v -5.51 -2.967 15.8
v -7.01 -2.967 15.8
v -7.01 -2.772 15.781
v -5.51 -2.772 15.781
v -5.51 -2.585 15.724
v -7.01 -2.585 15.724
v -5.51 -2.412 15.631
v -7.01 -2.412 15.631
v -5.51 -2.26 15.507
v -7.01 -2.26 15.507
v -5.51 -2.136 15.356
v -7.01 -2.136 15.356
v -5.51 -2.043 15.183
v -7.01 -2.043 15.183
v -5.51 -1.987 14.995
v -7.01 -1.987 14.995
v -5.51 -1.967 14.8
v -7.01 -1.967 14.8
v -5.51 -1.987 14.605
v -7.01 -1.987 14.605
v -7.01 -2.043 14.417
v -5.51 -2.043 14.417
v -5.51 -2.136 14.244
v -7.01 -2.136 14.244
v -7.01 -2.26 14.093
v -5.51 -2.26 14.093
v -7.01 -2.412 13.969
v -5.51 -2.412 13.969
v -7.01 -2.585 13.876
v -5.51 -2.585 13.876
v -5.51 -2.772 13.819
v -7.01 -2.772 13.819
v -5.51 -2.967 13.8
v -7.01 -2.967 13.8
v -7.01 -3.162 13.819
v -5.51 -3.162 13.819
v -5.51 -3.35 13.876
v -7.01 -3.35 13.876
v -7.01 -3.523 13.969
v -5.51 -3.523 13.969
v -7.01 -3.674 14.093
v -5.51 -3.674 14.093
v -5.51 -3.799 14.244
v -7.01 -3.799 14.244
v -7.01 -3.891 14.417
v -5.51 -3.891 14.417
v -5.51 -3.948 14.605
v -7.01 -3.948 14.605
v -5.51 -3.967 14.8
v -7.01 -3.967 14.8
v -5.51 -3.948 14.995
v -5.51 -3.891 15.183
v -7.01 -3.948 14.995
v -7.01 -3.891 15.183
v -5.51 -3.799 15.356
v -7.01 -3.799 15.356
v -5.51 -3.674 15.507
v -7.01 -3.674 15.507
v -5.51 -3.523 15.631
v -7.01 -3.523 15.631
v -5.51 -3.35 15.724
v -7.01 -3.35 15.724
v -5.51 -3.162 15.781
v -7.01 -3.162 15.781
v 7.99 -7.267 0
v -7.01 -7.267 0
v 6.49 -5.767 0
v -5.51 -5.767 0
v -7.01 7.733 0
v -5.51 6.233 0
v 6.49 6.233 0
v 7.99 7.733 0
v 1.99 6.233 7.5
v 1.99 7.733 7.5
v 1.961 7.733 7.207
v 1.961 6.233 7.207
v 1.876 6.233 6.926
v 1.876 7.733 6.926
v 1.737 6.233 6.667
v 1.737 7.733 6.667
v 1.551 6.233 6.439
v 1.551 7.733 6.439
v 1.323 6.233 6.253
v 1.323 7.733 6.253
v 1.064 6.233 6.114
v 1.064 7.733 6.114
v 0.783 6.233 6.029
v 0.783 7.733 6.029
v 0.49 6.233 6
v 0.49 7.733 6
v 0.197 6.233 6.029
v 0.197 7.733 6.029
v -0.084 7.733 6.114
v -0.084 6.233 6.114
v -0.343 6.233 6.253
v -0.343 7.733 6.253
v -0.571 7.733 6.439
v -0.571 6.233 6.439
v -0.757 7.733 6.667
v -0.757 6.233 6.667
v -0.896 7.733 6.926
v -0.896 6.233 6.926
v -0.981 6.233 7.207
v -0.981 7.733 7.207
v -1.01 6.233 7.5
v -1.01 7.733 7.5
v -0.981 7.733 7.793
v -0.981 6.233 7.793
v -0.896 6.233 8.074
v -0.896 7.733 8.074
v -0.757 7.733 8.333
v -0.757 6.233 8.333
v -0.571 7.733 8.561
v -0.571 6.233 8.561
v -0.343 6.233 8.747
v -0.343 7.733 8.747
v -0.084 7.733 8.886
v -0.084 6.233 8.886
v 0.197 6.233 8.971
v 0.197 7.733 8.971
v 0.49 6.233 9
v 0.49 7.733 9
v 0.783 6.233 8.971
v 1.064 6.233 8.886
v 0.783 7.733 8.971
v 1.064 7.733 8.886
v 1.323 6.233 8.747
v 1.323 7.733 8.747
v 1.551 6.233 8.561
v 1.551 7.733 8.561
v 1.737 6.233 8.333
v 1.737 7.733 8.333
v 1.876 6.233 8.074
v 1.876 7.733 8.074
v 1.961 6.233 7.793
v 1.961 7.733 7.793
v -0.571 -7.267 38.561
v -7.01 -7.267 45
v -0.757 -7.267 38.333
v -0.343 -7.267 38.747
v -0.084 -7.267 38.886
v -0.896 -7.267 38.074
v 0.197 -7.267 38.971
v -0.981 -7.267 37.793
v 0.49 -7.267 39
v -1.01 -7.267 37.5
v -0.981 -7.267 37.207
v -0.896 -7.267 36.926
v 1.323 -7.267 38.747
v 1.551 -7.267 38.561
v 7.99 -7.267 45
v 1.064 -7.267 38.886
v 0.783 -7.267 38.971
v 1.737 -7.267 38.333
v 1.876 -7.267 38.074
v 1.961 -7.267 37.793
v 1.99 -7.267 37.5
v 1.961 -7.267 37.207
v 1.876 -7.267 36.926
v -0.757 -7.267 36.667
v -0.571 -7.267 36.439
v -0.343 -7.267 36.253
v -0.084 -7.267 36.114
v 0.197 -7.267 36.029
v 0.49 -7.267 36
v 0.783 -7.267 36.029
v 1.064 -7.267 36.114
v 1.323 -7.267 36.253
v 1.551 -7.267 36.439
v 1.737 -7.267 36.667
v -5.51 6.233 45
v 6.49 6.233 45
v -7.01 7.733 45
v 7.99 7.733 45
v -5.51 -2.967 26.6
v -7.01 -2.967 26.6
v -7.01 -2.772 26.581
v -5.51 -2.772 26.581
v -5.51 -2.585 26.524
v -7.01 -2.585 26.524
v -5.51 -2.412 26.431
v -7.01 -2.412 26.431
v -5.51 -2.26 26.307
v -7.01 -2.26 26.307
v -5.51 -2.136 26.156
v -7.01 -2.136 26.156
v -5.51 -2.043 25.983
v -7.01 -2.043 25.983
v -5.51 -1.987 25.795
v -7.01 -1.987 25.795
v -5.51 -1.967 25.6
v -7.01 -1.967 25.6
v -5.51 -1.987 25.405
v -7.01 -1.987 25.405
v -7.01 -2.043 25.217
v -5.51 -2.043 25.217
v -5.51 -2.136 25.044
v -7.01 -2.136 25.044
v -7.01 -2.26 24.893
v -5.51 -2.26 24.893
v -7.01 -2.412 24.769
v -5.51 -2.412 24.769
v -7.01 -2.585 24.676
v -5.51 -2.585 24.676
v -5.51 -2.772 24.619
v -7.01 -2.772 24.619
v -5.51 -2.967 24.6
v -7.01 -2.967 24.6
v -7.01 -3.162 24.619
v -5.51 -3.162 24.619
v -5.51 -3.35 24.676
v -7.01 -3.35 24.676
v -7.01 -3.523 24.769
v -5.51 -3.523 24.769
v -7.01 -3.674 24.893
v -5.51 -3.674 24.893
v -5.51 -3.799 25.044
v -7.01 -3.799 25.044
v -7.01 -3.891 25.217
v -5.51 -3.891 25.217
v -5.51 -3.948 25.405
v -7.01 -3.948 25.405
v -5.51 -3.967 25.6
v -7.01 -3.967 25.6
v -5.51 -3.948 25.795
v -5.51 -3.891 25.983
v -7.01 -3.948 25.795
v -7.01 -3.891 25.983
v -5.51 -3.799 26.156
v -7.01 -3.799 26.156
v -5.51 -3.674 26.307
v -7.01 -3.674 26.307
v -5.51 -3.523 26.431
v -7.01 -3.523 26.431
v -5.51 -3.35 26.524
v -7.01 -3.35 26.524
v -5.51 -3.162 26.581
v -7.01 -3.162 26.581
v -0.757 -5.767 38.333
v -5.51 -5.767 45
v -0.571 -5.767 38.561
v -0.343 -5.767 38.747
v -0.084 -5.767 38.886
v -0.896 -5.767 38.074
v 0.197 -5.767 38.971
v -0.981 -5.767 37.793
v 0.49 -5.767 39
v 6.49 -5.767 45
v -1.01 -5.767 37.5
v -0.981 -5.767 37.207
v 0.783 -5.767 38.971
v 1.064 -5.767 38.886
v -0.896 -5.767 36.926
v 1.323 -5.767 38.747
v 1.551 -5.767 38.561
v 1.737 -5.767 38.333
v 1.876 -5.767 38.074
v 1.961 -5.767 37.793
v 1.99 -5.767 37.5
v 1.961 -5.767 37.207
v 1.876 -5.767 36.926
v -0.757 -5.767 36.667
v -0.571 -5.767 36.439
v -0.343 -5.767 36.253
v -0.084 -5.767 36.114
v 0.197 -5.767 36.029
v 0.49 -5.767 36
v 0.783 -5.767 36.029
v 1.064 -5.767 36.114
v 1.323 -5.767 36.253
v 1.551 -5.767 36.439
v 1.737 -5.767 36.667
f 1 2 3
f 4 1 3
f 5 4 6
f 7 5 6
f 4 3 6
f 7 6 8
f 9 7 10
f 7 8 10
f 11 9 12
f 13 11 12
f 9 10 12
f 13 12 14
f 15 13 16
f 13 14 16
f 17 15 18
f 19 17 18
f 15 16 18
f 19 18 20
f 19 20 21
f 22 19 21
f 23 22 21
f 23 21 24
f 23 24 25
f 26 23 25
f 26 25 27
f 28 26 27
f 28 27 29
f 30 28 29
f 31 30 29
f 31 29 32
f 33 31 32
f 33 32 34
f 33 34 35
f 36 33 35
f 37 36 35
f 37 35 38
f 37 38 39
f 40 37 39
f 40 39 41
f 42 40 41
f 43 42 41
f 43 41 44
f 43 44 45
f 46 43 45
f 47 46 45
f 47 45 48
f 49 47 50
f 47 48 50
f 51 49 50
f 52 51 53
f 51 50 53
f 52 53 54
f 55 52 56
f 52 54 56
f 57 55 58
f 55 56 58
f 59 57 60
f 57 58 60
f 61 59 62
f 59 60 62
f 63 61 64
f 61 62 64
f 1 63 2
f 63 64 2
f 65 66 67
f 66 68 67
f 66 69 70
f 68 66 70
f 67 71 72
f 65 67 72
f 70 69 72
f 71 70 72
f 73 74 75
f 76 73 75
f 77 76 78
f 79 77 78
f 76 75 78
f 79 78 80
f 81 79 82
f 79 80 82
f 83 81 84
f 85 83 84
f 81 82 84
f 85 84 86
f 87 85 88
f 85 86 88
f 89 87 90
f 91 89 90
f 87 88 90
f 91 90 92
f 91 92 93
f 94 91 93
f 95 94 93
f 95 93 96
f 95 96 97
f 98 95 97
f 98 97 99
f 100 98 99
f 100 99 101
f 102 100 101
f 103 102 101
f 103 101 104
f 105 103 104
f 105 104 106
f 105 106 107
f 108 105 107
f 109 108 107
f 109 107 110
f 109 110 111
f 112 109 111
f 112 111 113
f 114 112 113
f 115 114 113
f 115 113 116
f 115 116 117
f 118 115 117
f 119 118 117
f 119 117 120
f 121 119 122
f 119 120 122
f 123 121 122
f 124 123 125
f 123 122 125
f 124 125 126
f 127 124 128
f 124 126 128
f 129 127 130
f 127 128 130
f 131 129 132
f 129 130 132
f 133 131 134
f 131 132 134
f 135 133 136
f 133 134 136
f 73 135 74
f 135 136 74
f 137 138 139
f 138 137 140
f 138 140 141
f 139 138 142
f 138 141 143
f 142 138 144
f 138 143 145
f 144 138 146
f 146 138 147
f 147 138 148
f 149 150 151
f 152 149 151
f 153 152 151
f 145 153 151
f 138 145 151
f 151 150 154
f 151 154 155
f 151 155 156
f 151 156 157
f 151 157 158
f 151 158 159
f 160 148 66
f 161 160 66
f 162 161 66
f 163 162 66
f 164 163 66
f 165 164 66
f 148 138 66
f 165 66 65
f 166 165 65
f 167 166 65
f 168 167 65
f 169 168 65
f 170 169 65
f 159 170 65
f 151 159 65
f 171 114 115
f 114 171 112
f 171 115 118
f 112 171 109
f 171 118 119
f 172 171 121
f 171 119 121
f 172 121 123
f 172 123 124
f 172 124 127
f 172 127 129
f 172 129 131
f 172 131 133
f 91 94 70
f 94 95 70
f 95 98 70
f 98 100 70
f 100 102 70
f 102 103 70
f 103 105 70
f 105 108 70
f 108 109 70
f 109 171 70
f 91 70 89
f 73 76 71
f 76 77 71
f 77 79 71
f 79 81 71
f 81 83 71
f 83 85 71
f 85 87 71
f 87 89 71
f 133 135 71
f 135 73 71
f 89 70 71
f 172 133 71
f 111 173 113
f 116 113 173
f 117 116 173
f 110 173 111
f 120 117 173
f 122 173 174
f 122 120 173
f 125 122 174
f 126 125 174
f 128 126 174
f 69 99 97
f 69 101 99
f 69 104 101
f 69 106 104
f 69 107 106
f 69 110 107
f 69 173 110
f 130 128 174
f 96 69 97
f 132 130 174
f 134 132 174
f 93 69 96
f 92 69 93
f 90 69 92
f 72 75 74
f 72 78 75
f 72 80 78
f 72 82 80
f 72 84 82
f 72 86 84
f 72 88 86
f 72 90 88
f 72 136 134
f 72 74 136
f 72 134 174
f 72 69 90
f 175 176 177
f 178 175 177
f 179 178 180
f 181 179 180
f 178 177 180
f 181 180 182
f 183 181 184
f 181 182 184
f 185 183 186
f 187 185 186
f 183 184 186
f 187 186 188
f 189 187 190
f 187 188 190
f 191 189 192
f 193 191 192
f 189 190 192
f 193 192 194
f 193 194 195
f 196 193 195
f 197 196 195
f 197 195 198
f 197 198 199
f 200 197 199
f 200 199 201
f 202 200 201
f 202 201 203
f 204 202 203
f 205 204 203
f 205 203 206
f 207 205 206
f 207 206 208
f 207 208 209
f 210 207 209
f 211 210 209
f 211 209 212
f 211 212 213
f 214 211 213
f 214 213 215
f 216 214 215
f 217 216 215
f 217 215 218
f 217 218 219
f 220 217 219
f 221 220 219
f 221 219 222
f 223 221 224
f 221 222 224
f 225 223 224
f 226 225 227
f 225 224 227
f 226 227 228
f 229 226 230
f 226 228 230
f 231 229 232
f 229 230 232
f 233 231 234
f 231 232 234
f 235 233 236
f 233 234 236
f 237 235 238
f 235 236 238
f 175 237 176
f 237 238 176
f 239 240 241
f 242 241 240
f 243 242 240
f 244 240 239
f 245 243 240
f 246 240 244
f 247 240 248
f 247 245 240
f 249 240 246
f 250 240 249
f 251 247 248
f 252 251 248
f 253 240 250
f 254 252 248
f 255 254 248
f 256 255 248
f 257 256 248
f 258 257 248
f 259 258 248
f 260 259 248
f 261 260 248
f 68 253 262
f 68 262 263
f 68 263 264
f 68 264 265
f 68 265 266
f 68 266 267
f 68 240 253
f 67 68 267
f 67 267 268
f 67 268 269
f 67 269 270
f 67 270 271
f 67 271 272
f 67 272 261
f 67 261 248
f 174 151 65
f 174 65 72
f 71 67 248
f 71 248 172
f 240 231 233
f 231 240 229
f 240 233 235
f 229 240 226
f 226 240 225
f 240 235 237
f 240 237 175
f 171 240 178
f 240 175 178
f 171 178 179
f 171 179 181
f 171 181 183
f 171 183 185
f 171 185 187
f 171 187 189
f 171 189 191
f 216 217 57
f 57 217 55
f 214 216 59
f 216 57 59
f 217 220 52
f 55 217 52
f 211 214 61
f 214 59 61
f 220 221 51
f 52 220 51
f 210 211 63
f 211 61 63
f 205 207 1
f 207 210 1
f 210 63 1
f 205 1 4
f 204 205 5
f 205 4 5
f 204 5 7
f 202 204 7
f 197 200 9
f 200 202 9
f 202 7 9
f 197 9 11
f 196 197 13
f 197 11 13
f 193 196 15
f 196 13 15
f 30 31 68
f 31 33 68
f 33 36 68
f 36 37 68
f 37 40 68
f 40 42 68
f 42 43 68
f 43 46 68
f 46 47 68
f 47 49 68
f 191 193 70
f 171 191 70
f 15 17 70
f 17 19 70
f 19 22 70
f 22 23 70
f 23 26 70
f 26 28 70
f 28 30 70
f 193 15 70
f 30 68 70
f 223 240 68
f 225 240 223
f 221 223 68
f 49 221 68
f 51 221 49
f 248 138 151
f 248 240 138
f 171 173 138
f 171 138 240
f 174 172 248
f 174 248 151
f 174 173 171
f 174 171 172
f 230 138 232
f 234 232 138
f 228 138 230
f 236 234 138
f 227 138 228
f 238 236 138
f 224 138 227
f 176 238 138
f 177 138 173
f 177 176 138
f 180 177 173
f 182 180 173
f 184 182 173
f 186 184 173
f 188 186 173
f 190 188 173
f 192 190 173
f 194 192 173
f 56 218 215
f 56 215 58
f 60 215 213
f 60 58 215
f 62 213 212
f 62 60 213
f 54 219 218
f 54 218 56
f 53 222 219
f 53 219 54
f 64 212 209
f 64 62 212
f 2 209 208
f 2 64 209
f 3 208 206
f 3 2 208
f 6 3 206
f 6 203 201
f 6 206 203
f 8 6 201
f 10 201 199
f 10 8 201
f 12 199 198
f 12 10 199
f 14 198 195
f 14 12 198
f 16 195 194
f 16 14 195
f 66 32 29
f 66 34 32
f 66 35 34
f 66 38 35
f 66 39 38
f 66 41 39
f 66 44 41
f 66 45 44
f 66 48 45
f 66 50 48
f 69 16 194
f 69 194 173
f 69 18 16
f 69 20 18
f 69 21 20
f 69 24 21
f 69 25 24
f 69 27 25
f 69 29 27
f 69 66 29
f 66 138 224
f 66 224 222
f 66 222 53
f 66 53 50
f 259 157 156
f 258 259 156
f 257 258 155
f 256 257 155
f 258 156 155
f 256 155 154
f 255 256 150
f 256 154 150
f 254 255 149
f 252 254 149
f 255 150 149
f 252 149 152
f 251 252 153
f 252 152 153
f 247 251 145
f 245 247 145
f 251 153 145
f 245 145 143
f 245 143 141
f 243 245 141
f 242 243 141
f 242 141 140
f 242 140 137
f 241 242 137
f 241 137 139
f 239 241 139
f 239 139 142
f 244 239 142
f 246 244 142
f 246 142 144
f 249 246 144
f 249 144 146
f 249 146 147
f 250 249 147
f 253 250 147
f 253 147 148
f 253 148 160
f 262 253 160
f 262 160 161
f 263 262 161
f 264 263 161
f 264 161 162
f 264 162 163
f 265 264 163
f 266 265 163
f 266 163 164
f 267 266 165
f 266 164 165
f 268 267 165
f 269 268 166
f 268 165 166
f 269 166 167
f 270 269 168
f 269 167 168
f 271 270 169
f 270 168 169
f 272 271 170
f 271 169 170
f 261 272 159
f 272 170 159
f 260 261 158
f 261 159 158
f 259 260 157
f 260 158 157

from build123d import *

# Parameters (mm, degrees)
SKETCH_1_W          = 15
SKETCH_1_H          = 15
SKETCH_1_W_2        = 12
SKETCH_1_H_2        = 12
EXTRUDE_2_DEPTH     = 45
SKETCH_2_R          = 1.5
CUT_EXTRUDE_1_DEPTH = 10
SKETCH_3_R          = 1.5
CUT_EXTRUDE_2_DEPTH = 10
SKETCH_7_R          = 1
CUT_EXTRUDE_5_DEPTH = 10


with BuildPart() as part:
    # ｽｹｯﾁ1 → ﾎﾞｽ - 押し出し2 (new body)
    with BuildSketch(Plane.XY):
        with Locations((0.489915859, 0.232626086)):
            Rectangle(SKETCH_1_W, SKETCH_1_H)
        with Locations((0.489915859, 0.232626086)):
            Rectangle(SKETCH_1_W_2, SKETCH_1_H_2, mode=Mode.SUBTRACT)
    extrude(amount=EXTRUDE_2_DEPTH)

    # ｽｹｯﾁ2 → ｶｯﾄ - 押し出し1 (cut)
    with BuildSketch(Plane(origin=(0, 7.732626086, 0), x_dir=(1, 0, 0), z_dir=(0, 1, 0))):
        with Locations((0.489915859, -7.5)):
            Circle(SKETCH_2_R)
    extrude(amount=-CUT_EXTRUDE_1_DEPTH, mode=Mode.SUBTRACT)

    # ｽｹｯﾁ3 → ｶｯﾄ - 押し出し2 (cut)
    with BuildSketch(Plane.XZ.offset(7.267373914)):
        with Locations((0.489915859, 37.5)):
            Circle(SKETCH_3_R)
    extrude(amount=-CUT_EXTRUDE_2_DEPTH, mode=Mode.SUBTRACT)

    # ｽｹｯﾁ7 → ｶｯﾄ - 押し出し5 (cut)
    with BuildSketch(Plane.ZY.offset(7.010084141)):
        with Locations((25.6, -2.967373914)):
            Circle(SKETCH_7_R)
        with Locations((14.8, -2.967373914)):
            Circle(SKETCH_7_R)
    extrude(amount=-CUT_EXTRUDE_5_DEPTH, mode=Mode.SUBTRACT)


solid = part.part
